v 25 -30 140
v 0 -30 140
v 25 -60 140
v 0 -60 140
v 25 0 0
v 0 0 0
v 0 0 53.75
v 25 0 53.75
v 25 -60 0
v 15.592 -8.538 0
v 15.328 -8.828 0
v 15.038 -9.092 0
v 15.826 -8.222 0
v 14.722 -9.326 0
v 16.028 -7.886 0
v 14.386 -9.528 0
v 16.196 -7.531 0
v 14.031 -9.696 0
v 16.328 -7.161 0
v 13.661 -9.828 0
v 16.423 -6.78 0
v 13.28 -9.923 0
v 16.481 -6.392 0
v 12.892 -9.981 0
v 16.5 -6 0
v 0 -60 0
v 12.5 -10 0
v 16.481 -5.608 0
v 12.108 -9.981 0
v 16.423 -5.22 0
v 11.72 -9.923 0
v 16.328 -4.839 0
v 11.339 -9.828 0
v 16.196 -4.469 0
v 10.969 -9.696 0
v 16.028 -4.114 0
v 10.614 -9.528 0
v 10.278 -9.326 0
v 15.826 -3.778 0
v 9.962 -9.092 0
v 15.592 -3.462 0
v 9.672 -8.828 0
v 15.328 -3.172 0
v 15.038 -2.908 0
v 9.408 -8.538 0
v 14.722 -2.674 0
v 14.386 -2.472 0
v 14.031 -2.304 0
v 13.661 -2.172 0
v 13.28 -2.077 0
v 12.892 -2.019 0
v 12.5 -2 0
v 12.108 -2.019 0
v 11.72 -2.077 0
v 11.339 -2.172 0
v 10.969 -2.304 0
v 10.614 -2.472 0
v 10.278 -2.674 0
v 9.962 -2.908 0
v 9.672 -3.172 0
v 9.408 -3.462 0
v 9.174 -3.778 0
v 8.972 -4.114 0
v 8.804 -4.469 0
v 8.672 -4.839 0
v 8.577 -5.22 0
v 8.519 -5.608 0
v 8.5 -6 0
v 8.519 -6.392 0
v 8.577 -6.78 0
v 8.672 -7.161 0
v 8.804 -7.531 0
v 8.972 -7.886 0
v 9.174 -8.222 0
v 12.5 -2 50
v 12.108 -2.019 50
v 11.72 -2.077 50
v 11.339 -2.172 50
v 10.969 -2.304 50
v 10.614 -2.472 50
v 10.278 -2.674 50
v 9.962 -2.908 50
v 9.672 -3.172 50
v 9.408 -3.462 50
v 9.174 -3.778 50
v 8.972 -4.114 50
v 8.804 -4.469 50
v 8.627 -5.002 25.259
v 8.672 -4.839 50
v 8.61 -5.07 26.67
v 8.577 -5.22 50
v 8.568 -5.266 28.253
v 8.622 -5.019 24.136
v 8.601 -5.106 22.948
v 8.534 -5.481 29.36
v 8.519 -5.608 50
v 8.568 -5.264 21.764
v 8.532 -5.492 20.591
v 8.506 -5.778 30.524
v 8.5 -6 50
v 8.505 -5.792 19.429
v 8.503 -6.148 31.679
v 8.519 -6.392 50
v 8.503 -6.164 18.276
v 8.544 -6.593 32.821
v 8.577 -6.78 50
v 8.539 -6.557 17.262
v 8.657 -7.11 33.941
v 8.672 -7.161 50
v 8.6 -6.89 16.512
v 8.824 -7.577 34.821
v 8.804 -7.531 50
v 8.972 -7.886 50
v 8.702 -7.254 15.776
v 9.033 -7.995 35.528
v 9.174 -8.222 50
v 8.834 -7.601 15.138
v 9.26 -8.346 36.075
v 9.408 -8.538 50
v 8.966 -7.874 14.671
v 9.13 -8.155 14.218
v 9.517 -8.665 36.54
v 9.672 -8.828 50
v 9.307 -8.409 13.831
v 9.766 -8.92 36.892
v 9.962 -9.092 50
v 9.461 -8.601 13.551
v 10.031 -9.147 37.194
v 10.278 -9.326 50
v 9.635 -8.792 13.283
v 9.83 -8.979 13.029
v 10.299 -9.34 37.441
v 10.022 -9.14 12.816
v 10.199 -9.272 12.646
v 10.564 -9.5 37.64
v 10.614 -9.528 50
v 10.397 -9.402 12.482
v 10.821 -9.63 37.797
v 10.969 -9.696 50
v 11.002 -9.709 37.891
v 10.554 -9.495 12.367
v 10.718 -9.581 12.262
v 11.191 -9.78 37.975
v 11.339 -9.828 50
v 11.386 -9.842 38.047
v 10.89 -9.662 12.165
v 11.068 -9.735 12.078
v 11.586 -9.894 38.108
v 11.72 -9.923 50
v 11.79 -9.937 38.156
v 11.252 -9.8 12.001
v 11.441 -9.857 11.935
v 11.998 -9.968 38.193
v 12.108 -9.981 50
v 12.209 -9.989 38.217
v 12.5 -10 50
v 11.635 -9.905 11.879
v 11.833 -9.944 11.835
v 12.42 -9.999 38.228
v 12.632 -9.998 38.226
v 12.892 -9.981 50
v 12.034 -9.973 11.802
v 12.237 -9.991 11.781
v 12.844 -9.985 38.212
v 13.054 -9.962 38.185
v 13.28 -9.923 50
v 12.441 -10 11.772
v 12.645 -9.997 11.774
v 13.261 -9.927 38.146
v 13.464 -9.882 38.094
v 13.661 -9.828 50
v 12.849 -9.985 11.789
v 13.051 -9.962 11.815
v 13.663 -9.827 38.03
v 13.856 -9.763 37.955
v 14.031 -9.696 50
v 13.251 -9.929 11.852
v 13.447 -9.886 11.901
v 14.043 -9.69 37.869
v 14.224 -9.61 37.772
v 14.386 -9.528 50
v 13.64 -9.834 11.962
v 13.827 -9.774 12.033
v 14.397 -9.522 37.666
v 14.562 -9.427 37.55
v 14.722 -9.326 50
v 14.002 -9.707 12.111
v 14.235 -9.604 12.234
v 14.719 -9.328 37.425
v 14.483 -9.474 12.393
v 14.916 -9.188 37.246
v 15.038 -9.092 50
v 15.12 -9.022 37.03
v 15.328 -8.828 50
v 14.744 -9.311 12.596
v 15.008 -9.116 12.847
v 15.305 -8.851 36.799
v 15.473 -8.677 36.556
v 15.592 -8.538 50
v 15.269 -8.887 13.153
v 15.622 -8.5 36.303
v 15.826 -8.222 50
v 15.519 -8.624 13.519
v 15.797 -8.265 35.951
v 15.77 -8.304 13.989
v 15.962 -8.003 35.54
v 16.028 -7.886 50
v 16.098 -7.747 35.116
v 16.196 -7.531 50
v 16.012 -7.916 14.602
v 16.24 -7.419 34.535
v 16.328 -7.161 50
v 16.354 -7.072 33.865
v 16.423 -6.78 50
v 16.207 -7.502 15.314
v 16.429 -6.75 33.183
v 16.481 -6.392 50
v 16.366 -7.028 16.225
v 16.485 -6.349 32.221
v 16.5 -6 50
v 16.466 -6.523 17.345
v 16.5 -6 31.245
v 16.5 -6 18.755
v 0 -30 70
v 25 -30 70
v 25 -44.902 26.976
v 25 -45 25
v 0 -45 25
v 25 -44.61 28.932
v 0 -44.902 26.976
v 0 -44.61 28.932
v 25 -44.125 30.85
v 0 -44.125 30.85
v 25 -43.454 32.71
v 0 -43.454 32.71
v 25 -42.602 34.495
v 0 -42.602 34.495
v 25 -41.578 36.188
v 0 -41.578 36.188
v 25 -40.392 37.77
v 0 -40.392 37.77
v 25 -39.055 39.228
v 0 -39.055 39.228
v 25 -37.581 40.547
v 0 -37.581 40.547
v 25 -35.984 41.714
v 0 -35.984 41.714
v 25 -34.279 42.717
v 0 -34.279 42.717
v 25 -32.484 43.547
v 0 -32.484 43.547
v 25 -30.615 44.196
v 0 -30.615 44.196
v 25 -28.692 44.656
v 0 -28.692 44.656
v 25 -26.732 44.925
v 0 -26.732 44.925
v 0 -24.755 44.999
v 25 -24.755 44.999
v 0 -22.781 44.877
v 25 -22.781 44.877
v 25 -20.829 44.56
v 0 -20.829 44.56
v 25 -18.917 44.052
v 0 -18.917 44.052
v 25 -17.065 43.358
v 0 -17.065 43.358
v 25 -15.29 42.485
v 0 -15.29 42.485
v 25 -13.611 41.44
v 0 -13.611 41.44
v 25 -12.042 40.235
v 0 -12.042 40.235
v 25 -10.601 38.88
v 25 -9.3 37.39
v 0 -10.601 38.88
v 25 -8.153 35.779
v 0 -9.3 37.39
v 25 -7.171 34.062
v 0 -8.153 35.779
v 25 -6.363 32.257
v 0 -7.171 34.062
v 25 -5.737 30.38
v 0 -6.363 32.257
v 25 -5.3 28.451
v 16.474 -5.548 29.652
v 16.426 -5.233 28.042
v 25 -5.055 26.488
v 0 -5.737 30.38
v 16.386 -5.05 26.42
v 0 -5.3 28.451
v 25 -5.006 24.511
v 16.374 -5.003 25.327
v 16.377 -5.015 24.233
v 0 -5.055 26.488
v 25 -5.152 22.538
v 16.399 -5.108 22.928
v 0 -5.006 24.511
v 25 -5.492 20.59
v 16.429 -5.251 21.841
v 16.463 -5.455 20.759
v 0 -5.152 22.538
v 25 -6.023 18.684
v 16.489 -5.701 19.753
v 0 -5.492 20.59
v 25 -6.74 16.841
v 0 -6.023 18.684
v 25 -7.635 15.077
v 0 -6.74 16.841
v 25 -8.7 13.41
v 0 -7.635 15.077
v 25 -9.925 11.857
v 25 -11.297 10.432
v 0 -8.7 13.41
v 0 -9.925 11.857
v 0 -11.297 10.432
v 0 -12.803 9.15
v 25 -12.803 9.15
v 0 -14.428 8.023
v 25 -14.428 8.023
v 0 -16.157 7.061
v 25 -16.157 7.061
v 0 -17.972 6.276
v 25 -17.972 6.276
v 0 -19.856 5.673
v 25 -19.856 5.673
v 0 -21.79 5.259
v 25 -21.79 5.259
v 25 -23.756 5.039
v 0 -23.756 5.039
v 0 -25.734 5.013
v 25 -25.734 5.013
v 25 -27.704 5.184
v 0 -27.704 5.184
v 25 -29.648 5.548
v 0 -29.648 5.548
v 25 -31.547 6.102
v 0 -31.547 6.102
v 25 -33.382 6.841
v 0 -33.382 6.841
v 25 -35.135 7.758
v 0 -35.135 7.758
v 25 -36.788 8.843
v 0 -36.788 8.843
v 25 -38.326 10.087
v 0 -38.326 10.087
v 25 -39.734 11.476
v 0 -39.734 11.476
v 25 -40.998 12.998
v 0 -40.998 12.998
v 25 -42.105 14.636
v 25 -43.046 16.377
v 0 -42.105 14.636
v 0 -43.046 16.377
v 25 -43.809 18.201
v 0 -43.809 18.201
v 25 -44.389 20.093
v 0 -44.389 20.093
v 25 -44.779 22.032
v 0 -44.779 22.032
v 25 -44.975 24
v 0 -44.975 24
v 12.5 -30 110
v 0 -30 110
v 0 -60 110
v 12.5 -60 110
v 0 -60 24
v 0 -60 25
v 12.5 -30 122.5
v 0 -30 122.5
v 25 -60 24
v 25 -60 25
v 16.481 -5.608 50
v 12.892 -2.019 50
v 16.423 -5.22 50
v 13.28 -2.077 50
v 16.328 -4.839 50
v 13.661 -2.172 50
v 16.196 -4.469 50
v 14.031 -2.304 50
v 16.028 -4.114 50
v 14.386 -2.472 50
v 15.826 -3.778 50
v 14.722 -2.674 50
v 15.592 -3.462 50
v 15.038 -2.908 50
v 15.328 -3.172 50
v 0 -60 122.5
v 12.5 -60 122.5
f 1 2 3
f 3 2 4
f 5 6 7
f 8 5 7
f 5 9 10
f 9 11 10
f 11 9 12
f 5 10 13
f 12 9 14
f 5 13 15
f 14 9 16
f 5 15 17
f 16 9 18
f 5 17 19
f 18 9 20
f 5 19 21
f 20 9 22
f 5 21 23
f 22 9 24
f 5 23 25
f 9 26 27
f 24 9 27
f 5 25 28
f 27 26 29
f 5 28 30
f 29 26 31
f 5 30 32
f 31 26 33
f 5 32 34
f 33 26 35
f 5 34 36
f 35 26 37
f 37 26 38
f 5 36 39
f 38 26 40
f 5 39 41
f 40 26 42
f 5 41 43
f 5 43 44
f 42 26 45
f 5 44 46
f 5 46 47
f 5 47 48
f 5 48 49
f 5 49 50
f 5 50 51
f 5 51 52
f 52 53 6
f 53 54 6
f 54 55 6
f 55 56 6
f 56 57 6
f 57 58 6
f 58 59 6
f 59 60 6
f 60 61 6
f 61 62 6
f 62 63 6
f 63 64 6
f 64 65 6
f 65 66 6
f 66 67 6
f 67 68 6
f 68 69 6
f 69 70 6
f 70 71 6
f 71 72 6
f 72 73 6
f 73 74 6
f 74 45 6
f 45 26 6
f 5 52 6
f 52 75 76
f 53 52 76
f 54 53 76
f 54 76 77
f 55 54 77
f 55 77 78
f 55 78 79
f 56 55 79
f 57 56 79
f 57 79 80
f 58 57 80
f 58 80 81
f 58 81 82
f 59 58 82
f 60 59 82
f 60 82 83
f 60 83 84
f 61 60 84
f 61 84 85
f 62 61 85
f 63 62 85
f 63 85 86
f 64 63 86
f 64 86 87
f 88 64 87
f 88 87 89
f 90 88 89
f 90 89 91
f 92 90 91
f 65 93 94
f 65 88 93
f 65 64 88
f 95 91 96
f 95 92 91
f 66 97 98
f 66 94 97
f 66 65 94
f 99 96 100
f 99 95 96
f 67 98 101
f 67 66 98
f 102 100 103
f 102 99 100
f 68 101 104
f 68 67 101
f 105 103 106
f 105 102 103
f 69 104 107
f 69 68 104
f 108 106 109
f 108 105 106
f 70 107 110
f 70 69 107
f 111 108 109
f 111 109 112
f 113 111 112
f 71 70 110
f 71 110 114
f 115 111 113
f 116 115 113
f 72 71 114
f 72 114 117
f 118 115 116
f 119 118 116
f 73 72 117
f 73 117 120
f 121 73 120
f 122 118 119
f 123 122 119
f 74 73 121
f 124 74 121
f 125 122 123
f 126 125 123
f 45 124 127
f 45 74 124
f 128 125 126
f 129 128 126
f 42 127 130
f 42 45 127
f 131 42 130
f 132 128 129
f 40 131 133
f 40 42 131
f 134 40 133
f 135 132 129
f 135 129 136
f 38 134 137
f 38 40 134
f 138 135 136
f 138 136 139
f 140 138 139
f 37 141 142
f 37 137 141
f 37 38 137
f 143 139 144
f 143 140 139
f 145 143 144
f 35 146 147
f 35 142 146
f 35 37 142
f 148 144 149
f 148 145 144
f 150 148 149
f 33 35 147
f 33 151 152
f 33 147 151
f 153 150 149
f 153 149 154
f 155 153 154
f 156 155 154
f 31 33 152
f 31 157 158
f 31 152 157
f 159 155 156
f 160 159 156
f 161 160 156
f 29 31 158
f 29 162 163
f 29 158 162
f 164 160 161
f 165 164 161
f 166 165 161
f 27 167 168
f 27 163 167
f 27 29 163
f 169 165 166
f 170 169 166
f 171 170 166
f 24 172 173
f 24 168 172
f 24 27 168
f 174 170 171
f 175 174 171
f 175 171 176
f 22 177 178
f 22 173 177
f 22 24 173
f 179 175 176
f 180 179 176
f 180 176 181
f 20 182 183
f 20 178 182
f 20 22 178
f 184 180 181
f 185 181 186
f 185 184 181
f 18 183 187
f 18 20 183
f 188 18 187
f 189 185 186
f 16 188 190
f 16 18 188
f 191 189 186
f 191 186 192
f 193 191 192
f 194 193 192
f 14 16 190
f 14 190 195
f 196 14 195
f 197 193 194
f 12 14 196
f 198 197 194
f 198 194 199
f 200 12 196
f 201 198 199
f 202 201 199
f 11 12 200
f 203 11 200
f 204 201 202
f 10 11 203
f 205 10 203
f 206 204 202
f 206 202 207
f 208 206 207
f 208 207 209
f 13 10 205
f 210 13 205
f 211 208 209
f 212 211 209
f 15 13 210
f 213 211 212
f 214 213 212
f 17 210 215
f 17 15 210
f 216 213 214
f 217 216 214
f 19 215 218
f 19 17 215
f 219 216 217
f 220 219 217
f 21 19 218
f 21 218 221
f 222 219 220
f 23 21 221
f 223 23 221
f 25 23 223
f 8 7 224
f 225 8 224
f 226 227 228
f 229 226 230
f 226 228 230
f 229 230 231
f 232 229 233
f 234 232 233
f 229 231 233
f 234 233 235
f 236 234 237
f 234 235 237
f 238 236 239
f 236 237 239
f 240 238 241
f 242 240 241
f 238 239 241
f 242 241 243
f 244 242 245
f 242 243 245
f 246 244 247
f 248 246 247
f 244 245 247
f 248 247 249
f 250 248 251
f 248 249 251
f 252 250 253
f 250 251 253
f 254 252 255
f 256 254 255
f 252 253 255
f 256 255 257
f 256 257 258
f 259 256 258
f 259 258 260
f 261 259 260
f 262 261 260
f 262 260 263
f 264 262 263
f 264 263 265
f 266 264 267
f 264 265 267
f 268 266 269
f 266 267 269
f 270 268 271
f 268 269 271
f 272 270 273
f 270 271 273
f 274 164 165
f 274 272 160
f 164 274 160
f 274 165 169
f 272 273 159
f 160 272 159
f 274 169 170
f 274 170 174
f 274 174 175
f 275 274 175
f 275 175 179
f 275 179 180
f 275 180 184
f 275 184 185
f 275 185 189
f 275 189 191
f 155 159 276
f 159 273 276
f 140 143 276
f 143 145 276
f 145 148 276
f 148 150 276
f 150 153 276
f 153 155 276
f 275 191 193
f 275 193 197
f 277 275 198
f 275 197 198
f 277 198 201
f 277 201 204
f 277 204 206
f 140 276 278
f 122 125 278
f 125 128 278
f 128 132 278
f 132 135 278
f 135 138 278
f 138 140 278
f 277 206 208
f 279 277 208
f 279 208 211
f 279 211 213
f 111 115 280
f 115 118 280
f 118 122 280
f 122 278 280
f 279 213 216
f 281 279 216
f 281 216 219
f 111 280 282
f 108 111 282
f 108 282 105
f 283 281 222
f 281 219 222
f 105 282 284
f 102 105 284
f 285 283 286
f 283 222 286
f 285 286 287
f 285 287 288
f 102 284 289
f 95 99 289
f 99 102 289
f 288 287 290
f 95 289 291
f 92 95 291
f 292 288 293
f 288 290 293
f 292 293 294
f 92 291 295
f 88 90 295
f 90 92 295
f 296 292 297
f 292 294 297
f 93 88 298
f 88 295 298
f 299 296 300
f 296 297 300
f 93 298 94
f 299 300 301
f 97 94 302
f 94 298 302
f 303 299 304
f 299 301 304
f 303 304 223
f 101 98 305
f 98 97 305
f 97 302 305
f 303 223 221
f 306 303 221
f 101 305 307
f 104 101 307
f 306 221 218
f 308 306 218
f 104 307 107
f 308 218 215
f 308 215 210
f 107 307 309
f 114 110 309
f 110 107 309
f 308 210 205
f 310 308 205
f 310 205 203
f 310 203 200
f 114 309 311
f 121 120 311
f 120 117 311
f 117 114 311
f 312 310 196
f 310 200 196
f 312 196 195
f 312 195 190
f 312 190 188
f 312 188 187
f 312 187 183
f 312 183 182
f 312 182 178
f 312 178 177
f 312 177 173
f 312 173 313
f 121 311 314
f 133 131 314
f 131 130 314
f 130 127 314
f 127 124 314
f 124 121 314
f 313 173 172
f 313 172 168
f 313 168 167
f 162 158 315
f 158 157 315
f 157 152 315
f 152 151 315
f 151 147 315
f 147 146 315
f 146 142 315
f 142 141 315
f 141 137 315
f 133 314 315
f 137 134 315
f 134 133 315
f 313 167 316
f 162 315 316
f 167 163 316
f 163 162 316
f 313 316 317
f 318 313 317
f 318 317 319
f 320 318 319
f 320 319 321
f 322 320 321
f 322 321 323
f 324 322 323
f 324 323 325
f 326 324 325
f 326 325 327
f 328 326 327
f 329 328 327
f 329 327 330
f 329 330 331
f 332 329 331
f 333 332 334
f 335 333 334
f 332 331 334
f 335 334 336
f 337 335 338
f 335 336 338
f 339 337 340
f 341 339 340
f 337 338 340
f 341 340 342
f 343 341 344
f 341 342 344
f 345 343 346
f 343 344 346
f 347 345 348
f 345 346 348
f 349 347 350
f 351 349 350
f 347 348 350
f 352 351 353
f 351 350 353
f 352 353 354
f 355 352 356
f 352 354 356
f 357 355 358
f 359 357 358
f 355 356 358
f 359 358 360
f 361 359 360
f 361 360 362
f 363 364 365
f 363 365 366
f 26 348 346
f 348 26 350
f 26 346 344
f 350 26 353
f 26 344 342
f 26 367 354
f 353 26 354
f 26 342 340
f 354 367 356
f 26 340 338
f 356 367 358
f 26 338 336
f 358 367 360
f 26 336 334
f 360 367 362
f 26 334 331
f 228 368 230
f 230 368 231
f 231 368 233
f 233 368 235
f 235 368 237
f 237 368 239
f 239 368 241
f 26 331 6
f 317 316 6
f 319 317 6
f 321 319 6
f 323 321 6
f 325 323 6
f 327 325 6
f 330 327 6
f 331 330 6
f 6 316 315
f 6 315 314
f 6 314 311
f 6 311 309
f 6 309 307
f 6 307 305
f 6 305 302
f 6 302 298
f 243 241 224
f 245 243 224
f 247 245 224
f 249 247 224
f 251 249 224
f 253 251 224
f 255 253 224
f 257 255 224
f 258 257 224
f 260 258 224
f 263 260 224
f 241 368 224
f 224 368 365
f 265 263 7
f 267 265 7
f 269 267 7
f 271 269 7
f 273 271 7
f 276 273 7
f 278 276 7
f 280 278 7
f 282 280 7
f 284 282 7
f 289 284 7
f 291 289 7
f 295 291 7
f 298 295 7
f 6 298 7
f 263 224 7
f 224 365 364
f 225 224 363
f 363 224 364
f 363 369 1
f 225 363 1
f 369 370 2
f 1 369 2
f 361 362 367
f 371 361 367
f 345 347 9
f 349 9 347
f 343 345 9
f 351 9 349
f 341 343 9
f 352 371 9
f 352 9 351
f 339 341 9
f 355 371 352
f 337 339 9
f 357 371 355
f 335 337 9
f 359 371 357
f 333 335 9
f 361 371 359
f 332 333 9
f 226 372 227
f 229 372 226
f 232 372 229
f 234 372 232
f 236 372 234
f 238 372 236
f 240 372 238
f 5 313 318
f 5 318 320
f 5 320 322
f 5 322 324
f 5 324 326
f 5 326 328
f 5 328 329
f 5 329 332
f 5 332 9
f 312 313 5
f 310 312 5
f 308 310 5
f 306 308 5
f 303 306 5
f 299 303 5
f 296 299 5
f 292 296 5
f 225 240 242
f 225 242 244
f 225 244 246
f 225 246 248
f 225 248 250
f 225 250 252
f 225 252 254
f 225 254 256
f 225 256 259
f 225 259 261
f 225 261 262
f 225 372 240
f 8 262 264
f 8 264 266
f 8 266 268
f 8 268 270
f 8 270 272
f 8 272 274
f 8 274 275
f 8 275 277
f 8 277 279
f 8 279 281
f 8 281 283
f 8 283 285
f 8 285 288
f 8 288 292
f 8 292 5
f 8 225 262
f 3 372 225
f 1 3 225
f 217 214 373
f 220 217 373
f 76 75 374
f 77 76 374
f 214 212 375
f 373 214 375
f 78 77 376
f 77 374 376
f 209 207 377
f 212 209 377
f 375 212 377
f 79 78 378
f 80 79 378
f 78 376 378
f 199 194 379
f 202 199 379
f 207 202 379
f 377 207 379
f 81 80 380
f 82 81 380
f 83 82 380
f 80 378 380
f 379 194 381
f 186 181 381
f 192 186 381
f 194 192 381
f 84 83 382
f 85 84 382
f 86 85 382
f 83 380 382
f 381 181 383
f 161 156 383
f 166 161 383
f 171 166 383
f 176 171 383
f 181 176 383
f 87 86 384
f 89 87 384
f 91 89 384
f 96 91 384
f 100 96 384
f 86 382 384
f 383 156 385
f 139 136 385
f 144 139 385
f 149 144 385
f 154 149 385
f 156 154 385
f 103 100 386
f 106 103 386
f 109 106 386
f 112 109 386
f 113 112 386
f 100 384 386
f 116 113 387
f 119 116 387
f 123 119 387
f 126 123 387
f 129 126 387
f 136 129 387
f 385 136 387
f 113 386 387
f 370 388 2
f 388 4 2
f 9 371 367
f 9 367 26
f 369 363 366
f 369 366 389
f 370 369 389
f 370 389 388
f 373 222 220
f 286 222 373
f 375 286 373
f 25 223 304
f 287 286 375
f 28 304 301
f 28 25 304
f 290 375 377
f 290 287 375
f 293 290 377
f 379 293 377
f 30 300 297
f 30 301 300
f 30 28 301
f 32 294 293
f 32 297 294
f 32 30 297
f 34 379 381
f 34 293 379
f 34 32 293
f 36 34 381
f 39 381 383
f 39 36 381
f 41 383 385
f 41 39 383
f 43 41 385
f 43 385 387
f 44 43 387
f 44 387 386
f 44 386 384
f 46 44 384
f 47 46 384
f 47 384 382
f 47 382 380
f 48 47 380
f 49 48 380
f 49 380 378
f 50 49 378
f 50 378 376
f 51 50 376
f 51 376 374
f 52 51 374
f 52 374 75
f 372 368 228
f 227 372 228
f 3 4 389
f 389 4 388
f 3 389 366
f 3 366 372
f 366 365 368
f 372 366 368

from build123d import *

# Parameters (mm, degrees)
F1_DEPTH = 25
F3_DEPTH = 50
F5_DEPTH = 60


with BuildPart() as f1:
    # F0 (on Right) → F1 (new body)
    with BuildSketch(Plane.YZ):
        with BuildLine():
            Line((-60, 0), (0, 0))
            Line((0, 0), (0, 53.749684))
            Line((0, 53.749684), (-30, 70))
            Line((-30, 70), (-30, 140))
            Line((-30, 140), (-60, 140))
            Line((-60, 140), (-60, 25))
            Line((-60, 25), (-45, 25))
            ThreePointArc((-45, 25), (-5.006255, 25.500156), (-44.974984, 24))
            Line((-44.974984, 24), (-60, 24))
            Line((-60, 24), (-60, 12))
            Line((-60, 12), (-60, 0))
        make_face()
    extrude(amount=F1_DEPTH)

    # F2 (on Top) → F3 (cut)
    with BuildSketch(Plane.XY):
        with BuildLine():
            ThreePointArc((12.5, -2), (9.671573, -8.828427), (16.5, -6))
            ThreePointArc((16.5, -6), (15.328427, -3.171573), (12.5, -2))
        make_face()
    extrude(amount=F3_DEPTH, mode=Mode.SUBTRACT)

    # F4 (on Front) → F5 (cut)
    with BuildSketch(Plane.XZ):
        Polygon((-7.744254, 110), (0, 110), (12.5, 110), (12.5, 122.5), (-7.744254, 122.5), align=None)
    extrude(amount=F5_DEPTH, mode=Mode.SUBTRACT)


solid = f1.part
